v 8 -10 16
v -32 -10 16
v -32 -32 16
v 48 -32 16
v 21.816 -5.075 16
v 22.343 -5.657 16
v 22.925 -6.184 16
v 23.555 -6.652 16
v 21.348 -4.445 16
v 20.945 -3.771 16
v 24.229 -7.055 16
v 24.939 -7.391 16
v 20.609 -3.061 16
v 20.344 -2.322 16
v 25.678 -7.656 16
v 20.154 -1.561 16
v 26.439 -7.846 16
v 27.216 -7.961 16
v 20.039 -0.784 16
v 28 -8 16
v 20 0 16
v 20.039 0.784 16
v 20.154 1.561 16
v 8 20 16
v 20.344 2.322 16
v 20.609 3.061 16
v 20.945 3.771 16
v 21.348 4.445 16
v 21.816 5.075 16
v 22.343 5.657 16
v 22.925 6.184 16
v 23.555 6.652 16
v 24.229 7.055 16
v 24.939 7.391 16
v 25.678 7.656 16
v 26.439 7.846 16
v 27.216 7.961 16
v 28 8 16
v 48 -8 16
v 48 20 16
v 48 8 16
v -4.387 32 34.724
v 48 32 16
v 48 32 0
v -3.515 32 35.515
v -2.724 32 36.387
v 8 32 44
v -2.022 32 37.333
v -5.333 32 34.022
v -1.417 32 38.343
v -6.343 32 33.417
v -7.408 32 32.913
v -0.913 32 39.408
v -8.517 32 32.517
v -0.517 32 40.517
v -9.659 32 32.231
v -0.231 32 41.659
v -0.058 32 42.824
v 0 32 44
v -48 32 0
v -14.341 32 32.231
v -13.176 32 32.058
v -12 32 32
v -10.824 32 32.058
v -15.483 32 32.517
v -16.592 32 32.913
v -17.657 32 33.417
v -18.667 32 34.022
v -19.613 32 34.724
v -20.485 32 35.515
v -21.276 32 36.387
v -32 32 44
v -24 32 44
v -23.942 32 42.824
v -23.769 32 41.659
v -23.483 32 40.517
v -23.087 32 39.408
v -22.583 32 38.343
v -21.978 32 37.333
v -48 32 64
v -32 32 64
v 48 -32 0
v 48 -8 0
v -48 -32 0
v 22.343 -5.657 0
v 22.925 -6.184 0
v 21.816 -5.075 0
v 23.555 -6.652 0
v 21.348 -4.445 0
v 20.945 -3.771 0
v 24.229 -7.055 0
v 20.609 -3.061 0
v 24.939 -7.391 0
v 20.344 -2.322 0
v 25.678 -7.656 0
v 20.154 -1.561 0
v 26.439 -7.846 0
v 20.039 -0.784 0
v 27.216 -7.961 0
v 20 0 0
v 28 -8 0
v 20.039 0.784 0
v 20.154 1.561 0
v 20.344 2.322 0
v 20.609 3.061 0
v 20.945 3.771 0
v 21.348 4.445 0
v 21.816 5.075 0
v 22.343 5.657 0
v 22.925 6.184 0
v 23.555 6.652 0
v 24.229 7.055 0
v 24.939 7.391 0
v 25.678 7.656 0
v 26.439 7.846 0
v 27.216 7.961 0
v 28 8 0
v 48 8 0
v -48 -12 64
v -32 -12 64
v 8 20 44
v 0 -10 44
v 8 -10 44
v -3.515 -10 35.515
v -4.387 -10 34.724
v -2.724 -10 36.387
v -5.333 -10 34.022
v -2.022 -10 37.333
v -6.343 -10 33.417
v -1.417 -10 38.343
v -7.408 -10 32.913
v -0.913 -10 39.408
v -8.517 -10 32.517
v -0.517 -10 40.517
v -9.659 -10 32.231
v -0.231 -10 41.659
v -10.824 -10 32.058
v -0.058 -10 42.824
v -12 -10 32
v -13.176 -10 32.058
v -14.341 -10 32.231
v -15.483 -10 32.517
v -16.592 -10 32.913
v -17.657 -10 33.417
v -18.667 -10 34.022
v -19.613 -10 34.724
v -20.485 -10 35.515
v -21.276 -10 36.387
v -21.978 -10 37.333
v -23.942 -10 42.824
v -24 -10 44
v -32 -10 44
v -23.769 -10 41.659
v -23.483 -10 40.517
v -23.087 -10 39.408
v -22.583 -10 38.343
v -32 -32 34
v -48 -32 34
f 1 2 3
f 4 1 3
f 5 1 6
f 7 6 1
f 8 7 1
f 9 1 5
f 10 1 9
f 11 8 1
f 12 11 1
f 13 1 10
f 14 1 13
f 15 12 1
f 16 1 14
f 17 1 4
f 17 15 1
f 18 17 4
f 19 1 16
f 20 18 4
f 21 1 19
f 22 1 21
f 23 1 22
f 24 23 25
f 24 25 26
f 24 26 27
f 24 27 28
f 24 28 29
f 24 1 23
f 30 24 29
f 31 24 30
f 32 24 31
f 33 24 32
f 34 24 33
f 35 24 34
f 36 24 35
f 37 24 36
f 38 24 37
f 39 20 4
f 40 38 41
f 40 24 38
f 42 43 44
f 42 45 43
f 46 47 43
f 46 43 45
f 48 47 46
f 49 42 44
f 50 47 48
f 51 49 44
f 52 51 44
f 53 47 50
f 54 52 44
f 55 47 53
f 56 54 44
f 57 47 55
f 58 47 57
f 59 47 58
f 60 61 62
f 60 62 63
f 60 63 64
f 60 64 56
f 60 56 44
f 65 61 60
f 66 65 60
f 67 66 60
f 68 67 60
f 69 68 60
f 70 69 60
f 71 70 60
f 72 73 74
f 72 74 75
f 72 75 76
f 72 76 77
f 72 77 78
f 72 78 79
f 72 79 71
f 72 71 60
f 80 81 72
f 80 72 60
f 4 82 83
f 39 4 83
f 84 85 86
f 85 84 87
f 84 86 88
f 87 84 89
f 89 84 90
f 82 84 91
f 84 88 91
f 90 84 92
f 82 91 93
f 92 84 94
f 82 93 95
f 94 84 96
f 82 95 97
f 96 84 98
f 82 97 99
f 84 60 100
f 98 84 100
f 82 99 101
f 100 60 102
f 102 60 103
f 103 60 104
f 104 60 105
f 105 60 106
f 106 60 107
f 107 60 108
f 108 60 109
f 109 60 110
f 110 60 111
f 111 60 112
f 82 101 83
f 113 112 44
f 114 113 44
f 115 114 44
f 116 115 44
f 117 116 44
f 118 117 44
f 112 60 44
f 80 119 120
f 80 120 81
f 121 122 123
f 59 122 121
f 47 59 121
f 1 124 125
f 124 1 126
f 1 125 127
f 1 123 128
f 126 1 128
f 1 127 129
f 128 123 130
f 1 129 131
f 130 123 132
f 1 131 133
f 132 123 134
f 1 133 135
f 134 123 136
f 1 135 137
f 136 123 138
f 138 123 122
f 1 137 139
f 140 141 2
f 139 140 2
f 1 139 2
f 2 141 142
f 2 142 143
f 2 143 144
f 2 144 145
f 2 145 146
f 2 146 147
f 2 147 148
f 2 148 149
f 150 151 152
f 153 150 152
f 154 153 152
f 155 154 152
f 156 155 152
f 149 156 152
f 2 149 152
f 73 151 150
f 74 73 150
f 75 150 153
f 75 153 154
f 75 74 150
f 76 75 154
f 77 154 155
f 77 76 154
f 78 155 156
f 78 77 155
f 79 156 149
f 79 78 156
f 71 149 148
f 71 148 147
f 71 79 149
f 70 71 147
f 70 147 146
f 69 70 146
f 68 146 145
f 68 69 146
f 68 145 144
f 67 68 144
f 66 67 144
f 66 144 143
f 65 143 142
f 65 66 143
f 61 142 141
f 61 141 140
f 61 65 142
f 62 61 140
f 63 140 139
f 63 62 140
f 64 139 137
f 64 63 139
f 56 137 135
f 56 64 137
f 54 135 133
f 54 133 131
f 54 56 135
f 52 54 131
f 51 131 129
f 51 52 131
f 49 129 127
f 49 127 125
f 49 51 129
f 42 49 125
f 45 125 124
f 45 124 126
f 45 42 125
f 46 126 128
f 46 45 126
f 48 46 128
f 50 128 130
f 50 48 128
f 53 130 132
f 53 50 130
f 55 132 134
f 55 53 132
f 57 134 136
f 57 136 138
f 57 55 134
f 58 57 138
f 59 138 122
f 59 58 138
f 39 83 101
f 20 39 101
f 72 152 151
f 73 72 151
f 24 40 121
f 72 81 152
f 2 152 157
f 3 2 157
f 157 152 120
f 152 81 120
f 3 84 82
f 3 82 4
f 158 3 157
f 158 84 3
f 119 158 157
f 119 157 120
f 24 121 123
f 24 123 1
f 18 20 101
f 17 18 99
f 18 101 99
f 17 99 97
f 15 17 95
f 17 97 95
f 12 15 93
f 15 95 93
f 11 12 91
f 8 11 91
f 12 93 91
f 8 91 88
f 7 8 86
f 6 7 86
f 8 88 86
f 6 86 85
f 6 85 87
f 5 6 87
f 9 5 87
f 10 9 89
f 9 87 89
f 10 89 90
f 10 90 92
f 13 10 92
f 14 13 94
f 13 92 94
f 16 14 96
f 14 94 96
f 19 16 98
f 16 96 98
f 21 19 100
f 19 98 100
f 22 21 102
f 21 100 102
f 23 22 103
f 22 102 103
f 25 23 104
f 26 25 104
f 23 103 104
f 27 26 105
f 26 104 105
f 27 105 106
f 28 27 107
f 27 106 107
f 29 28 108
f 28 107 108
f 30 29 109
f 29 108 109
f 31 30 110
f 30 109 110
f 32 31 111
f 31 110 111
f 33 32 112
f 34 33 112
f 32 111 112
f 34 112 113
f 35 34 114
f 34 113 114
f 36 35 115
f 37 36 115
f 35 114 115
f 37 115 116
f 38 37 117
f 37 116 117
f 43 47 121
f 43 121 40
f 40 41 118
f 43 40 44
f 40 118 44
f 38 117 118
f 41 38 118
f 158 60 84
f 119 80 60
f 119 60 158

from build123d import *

# Parameters (mm, degrees)
F1_DEPTH = 16
F3_DEPTH = 16
F5_DEPTH = 42
F7_DEPTH = 12


with BuildPart() as f1:
    # F0 (on Top) → F1 (new body)
    with BuildSketch(Plane.XY):
        with BuildLine():
            Line((-48, 32), (-48, -32))
            Line((-48, -32), (48, -32))
            Line((48, -32), (48, -8))
            Line((48, -8), (28, -8))
            ThreePointArc((28, -8), (20, 0), (28, 8))
            Line((28, 8), (48, 8))
            Line((48, 8), (48, 32))
            Line((48, 32), (-48, 32))
        make_face()
    extrude(amount=F1_DEPTH)

    # F2 (on face) → F3 (join)
    with BuildSketch(Plane(origin=(-48, 0, 0), x_dir=(0, -1, 0), z_dir=(-1, 0, 0))):
        Polygon((-32, 64), (-32, 16), (32, 16), (32, 34), (12, 64), align=None)
    extrude(amount=-F3_DEPTH)

    # F4 (on face) → F5 (join)
    with BuildSketch(Plane(origin=(0, 32, 0), x_dir=(-1, 0, 0), z_dir=(0, 1, 0))):
        with BuildLine():
            Line((-8, 16), (32, 16))
            Line((32, 16), (32, 44))
            Line((32, 44), (24, 44))
            ThreePointArc((24, 44), (12, 32), (0, 44))
            Line((0, 44), (-8, 44))
            Line((-8, 44), (-8, 16))
        make_face()
    extrude(amount=-F5_DEPTH)

    # F6 (on face) → F7 (join)
    with BuildSketch(Plane(origin=(0, 32, 0), x_dir=(-1, 0, 0), z_dir=(0, 1, 0))):
        Polygon((-8, 44), (-48, 16), (-8, 16), align=None)
    extrude(amount=-F7_DEPTH)


solid = f1.part
